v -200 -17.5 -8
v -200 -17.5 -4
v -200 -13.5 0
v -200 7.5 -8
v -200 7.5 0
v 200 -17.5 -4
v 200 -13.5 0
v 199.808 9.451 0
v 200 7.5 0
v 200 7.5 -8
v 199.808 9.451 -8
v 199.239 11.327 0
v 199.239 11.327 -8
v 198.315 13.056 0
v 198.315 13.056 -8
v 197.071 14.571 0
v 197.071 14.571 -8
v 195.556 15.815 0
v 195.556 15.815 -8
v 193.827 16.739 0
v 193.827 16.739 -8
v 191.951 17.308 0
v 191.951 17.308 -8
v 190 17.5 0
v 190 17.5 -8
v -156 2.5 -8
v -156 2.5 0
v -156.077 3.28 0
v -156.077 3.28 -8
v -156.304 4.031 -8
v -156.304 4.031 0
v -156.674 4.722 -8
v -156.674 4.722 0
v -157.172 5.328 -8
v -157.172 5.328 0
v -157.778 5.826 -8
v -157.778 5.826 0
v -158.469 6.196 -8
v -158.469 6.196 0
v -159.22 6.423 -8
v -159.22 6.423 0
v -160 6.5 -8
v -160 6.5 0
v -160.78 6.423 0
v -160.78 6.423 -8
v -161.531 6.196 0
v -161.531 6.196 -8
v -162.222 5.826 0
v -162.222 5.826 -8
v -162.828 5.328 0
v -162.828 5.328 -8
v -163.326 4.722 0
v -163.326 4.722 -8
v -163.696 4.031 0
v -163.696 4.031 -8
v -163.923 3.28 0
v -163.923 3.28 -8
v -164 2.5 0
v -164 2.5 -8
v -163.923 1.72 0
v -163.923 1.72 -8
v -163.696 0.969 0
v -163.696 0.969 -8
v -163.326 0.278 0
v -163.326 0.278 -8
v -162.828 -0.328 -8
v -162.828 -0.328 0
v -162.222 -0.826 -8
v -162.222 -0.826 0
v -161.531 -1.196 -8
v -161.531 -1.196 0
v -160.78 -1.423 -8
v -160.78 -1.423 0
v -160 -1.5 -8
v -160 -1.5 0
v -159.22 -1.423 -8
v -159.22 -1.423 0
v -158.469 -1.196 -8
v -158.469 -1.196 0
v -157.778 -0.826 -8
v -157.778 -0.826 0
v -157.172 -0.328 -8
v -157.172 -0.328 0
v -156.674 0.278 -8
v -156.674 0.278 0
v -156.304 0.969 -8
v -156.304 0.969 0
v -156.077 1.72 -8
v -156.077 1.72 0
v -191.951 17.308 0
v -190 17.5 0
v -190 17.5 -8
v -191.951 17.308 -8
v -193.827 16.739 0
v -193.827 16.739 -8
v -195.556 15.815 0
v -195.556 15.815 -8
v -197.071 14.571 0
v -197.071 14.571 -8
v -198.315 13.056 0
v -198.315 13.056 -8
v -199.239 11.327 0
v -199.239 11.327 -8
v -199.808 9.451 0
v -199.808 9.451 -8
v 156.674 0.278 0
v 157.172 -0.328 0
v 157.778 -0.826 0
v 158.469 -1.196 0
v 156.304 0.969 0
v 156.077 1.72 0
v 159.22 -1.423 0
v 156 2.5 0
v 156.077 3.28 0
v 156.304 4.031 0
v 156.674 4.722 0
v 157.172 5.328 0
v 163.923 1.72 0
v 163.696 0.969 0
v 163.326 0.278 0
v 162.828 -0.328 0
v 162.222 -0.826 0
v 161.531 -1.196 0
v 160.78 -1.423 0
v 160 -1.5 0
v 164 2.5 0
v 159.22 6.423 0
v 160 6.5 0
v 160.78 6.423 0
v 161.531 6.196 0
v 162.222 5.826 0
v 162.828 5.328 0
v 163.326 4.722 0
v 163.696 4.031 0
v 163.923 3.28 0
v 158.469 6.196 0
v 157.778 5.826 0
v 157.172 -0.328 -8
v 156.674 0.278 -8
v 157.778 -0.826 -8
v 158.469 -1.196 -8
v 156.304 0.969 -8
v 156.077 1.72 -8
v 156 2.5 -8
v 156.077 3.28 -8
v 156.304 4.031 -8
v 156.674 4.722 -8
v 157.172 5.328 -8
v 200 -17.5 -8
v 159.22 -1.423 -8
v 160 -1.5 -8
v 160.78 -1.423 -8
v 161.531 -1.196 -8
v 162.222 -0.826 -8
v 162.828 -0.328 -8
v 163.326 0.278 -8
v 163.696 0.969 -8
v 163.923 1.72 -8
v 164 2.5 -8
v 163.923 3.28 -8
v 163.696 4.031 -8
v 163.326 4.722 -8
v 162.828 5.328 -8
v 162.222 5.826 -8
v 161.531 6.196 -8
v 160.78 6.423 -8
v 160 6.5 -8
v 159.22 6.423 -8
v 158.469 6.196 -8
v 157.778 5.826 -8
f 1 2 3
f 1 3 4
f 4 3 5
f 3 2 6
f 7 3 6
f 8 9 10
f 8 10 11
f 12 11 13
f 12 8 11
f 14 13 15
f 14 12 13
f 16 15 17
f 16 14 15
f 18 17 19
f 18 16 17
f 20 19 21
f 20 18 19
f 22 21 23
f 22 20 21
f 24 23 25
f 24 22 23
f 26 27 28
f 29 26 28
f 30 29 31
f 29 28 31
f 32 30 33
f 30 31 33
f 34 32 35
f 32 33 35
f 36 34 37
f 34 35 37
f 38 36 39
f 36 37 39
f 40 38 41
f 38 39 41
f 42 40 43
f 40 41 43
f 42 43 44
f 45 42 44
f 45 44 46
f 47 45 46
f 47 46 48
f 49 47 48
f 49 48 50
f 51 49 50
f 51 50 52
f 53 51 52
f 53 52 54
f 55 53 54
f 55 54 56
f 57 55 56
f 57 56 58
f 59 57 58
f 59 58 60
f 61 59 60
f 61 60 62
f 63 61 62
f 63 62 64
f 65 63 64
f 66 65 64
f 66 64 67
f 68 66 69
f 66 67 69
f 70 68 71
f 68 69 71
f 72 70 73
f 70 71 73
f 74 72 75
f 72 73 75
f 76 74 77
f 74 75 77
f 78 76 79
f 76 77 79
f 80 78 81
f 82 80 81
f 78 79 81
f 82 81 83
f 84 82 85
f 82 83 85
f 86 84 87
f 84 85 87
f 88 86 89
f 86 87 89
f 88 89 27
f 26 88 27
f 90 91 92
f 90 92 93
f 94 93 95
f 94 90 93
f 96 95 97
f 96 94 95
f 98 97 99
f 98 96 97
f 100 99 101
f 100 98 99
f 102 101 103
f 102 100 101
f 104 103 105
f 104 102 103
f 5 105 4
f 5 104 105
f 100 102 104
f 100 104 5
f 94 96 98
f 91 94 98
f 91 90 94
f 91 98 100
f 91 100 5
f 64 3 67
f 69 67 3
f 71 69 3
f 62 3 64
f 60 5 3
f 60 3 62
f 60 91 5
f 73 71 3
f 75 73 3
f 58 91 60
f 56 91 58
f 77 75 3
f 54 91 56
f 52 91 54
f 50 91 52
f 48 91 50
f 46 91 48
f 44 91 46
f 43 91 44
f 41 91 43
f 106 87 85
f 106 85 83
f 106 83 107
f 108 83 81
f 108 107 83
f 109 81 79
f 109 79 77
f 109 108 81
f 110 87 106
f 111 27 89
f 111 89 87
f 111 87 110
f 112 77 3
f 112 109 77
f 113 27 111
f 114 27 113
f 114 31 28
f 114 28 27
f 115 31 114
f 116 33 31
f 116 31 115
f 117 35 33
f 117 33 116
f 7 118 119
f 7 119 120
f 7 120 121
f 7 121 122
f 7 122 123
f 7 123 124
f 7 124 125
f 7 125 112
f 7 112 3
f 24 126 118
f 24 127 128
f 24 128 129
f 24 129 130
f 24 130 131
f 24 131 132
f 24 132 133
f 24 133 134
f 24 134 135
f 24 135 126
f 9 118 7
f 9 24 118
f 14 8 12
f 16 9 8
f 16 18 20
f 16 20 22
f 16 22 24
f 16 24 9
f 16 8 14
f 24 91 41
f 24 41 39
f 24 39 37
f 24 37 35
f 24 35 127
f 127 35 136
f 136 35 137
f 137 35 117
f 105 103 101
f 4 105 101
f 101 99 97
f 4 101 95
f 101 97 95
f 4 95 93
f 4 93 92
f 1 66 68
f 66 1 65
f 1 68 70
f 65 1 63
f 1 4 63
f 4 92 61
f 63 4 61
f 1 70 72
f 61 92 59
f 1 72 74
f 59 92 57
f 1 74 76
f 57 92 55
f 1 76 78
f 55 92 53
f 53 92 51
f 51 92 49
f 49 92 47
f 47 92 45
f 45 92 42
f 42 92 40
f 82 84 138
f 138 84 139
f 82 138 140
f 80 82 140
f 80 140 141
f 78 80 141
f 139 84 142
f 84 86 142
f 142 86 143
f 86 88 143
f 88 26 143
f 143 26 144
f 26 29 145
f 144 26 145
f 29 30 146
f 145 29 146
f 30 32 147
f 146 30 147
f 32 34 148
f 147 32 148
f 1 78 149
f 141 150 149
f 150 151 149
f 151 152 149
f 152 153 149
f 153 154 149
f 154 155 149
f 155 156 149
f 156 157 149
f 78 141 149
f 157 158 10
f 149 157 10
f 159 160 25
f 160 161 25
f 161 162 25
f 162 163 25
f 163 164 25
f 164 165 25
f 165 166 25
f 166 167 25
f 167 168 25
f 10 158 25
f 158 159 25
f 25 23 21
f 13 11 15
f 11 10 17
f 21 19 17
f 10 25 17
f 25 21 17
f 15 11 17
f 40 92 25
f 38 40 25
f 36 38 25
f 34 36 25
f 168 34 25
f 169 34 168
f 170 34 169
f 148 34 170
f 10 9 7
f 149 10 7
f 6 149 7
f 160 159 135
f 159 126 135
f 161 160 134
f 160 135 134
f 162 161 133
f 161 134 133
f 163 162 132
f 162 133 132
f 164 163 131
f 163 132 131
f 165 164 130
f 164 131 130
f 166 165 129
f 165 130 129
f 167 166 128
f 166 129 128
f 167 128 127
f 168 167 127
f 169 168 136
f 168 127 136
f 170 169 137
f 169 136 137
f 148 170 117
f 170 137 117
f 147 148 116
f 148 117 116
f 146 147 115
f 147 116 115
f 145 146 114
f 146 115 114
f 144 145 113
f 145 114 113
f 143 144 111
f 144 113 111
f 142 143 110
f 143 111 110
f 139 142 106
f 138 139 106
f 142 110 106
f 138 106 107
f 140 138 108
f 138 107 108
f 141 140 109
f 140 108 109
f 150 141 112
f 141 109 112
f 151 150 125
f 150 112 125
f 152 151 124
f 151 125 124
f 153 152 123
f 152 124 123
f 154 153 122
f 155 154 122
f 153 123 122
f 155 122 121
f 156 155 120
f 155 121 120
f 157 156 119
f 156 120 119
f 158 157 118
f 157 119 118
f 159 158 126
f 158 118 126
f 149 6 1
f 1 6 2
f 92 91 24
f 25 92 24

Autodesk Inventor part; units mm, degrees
ref_plane "YZ Plane" through (0, 0, 0) normal (1, 0, 0) x (0, 1, 0)
ref_plane "XZ Plane" through (0, 0, 0) normal (0, 1, 0) x (-1, 0, 0)
ref_plane "XY Plane" through (0, 0, 0) normal (0, 0, 1) x (1, 0, 0)
sketch "Sketch1" plane through (0, 0, 0) normal (0, 0, 1) x (1, 0, 0)
  line L0 (0, 26.9853) -> (0, -24.9142) projected
  line L1 (-282.8995, 0) -> (282.8995, 0) projected
  line L2 (-190, 17.5) -> (190, 17.5)
  line L3 (200, 7.5) -> (200, -17.5)
  line L4 (200, -17.5) -> (-200, -17.5)
  line L5 (-200, -17.5) -> (-200, 7.5)
  arc A0 (-190, 17.5) -> (-200, 7.5) centre (-190, 7.5) ccw
  arc A1 (200, 7.5) -> (190, 17.5) centre (190, 7.5) ccw
  circle A2 centre (-160, 2.5) radius 4
  circle A3 centre (160, 2.5) radius 4
  point P0 (0, 0)
  point P1 (-200, 17.5)
  point P2 (200, 17.5)
  dimension "d0" = 35
  dimension "d1" = 400
  dimension "d2" = 10
  dimension "d3" = 8
  dimension "d4" = 160
  dimension "d5" = 20
extrude "Extrusion1" add sketch "Sketch1" against normal blind 8 contours L2 A1 L3 L1 A3 L0 | L0 L1 A2 L5 A0 L2 | L1 A3 L3 L4 L0 | L0 L4 L5 L1 A2
chamfer "Chamfer1" distance 4 angle 45 1 edges at (0, -17.5, 0)
properties part number "SlipersLåda 211018009"
